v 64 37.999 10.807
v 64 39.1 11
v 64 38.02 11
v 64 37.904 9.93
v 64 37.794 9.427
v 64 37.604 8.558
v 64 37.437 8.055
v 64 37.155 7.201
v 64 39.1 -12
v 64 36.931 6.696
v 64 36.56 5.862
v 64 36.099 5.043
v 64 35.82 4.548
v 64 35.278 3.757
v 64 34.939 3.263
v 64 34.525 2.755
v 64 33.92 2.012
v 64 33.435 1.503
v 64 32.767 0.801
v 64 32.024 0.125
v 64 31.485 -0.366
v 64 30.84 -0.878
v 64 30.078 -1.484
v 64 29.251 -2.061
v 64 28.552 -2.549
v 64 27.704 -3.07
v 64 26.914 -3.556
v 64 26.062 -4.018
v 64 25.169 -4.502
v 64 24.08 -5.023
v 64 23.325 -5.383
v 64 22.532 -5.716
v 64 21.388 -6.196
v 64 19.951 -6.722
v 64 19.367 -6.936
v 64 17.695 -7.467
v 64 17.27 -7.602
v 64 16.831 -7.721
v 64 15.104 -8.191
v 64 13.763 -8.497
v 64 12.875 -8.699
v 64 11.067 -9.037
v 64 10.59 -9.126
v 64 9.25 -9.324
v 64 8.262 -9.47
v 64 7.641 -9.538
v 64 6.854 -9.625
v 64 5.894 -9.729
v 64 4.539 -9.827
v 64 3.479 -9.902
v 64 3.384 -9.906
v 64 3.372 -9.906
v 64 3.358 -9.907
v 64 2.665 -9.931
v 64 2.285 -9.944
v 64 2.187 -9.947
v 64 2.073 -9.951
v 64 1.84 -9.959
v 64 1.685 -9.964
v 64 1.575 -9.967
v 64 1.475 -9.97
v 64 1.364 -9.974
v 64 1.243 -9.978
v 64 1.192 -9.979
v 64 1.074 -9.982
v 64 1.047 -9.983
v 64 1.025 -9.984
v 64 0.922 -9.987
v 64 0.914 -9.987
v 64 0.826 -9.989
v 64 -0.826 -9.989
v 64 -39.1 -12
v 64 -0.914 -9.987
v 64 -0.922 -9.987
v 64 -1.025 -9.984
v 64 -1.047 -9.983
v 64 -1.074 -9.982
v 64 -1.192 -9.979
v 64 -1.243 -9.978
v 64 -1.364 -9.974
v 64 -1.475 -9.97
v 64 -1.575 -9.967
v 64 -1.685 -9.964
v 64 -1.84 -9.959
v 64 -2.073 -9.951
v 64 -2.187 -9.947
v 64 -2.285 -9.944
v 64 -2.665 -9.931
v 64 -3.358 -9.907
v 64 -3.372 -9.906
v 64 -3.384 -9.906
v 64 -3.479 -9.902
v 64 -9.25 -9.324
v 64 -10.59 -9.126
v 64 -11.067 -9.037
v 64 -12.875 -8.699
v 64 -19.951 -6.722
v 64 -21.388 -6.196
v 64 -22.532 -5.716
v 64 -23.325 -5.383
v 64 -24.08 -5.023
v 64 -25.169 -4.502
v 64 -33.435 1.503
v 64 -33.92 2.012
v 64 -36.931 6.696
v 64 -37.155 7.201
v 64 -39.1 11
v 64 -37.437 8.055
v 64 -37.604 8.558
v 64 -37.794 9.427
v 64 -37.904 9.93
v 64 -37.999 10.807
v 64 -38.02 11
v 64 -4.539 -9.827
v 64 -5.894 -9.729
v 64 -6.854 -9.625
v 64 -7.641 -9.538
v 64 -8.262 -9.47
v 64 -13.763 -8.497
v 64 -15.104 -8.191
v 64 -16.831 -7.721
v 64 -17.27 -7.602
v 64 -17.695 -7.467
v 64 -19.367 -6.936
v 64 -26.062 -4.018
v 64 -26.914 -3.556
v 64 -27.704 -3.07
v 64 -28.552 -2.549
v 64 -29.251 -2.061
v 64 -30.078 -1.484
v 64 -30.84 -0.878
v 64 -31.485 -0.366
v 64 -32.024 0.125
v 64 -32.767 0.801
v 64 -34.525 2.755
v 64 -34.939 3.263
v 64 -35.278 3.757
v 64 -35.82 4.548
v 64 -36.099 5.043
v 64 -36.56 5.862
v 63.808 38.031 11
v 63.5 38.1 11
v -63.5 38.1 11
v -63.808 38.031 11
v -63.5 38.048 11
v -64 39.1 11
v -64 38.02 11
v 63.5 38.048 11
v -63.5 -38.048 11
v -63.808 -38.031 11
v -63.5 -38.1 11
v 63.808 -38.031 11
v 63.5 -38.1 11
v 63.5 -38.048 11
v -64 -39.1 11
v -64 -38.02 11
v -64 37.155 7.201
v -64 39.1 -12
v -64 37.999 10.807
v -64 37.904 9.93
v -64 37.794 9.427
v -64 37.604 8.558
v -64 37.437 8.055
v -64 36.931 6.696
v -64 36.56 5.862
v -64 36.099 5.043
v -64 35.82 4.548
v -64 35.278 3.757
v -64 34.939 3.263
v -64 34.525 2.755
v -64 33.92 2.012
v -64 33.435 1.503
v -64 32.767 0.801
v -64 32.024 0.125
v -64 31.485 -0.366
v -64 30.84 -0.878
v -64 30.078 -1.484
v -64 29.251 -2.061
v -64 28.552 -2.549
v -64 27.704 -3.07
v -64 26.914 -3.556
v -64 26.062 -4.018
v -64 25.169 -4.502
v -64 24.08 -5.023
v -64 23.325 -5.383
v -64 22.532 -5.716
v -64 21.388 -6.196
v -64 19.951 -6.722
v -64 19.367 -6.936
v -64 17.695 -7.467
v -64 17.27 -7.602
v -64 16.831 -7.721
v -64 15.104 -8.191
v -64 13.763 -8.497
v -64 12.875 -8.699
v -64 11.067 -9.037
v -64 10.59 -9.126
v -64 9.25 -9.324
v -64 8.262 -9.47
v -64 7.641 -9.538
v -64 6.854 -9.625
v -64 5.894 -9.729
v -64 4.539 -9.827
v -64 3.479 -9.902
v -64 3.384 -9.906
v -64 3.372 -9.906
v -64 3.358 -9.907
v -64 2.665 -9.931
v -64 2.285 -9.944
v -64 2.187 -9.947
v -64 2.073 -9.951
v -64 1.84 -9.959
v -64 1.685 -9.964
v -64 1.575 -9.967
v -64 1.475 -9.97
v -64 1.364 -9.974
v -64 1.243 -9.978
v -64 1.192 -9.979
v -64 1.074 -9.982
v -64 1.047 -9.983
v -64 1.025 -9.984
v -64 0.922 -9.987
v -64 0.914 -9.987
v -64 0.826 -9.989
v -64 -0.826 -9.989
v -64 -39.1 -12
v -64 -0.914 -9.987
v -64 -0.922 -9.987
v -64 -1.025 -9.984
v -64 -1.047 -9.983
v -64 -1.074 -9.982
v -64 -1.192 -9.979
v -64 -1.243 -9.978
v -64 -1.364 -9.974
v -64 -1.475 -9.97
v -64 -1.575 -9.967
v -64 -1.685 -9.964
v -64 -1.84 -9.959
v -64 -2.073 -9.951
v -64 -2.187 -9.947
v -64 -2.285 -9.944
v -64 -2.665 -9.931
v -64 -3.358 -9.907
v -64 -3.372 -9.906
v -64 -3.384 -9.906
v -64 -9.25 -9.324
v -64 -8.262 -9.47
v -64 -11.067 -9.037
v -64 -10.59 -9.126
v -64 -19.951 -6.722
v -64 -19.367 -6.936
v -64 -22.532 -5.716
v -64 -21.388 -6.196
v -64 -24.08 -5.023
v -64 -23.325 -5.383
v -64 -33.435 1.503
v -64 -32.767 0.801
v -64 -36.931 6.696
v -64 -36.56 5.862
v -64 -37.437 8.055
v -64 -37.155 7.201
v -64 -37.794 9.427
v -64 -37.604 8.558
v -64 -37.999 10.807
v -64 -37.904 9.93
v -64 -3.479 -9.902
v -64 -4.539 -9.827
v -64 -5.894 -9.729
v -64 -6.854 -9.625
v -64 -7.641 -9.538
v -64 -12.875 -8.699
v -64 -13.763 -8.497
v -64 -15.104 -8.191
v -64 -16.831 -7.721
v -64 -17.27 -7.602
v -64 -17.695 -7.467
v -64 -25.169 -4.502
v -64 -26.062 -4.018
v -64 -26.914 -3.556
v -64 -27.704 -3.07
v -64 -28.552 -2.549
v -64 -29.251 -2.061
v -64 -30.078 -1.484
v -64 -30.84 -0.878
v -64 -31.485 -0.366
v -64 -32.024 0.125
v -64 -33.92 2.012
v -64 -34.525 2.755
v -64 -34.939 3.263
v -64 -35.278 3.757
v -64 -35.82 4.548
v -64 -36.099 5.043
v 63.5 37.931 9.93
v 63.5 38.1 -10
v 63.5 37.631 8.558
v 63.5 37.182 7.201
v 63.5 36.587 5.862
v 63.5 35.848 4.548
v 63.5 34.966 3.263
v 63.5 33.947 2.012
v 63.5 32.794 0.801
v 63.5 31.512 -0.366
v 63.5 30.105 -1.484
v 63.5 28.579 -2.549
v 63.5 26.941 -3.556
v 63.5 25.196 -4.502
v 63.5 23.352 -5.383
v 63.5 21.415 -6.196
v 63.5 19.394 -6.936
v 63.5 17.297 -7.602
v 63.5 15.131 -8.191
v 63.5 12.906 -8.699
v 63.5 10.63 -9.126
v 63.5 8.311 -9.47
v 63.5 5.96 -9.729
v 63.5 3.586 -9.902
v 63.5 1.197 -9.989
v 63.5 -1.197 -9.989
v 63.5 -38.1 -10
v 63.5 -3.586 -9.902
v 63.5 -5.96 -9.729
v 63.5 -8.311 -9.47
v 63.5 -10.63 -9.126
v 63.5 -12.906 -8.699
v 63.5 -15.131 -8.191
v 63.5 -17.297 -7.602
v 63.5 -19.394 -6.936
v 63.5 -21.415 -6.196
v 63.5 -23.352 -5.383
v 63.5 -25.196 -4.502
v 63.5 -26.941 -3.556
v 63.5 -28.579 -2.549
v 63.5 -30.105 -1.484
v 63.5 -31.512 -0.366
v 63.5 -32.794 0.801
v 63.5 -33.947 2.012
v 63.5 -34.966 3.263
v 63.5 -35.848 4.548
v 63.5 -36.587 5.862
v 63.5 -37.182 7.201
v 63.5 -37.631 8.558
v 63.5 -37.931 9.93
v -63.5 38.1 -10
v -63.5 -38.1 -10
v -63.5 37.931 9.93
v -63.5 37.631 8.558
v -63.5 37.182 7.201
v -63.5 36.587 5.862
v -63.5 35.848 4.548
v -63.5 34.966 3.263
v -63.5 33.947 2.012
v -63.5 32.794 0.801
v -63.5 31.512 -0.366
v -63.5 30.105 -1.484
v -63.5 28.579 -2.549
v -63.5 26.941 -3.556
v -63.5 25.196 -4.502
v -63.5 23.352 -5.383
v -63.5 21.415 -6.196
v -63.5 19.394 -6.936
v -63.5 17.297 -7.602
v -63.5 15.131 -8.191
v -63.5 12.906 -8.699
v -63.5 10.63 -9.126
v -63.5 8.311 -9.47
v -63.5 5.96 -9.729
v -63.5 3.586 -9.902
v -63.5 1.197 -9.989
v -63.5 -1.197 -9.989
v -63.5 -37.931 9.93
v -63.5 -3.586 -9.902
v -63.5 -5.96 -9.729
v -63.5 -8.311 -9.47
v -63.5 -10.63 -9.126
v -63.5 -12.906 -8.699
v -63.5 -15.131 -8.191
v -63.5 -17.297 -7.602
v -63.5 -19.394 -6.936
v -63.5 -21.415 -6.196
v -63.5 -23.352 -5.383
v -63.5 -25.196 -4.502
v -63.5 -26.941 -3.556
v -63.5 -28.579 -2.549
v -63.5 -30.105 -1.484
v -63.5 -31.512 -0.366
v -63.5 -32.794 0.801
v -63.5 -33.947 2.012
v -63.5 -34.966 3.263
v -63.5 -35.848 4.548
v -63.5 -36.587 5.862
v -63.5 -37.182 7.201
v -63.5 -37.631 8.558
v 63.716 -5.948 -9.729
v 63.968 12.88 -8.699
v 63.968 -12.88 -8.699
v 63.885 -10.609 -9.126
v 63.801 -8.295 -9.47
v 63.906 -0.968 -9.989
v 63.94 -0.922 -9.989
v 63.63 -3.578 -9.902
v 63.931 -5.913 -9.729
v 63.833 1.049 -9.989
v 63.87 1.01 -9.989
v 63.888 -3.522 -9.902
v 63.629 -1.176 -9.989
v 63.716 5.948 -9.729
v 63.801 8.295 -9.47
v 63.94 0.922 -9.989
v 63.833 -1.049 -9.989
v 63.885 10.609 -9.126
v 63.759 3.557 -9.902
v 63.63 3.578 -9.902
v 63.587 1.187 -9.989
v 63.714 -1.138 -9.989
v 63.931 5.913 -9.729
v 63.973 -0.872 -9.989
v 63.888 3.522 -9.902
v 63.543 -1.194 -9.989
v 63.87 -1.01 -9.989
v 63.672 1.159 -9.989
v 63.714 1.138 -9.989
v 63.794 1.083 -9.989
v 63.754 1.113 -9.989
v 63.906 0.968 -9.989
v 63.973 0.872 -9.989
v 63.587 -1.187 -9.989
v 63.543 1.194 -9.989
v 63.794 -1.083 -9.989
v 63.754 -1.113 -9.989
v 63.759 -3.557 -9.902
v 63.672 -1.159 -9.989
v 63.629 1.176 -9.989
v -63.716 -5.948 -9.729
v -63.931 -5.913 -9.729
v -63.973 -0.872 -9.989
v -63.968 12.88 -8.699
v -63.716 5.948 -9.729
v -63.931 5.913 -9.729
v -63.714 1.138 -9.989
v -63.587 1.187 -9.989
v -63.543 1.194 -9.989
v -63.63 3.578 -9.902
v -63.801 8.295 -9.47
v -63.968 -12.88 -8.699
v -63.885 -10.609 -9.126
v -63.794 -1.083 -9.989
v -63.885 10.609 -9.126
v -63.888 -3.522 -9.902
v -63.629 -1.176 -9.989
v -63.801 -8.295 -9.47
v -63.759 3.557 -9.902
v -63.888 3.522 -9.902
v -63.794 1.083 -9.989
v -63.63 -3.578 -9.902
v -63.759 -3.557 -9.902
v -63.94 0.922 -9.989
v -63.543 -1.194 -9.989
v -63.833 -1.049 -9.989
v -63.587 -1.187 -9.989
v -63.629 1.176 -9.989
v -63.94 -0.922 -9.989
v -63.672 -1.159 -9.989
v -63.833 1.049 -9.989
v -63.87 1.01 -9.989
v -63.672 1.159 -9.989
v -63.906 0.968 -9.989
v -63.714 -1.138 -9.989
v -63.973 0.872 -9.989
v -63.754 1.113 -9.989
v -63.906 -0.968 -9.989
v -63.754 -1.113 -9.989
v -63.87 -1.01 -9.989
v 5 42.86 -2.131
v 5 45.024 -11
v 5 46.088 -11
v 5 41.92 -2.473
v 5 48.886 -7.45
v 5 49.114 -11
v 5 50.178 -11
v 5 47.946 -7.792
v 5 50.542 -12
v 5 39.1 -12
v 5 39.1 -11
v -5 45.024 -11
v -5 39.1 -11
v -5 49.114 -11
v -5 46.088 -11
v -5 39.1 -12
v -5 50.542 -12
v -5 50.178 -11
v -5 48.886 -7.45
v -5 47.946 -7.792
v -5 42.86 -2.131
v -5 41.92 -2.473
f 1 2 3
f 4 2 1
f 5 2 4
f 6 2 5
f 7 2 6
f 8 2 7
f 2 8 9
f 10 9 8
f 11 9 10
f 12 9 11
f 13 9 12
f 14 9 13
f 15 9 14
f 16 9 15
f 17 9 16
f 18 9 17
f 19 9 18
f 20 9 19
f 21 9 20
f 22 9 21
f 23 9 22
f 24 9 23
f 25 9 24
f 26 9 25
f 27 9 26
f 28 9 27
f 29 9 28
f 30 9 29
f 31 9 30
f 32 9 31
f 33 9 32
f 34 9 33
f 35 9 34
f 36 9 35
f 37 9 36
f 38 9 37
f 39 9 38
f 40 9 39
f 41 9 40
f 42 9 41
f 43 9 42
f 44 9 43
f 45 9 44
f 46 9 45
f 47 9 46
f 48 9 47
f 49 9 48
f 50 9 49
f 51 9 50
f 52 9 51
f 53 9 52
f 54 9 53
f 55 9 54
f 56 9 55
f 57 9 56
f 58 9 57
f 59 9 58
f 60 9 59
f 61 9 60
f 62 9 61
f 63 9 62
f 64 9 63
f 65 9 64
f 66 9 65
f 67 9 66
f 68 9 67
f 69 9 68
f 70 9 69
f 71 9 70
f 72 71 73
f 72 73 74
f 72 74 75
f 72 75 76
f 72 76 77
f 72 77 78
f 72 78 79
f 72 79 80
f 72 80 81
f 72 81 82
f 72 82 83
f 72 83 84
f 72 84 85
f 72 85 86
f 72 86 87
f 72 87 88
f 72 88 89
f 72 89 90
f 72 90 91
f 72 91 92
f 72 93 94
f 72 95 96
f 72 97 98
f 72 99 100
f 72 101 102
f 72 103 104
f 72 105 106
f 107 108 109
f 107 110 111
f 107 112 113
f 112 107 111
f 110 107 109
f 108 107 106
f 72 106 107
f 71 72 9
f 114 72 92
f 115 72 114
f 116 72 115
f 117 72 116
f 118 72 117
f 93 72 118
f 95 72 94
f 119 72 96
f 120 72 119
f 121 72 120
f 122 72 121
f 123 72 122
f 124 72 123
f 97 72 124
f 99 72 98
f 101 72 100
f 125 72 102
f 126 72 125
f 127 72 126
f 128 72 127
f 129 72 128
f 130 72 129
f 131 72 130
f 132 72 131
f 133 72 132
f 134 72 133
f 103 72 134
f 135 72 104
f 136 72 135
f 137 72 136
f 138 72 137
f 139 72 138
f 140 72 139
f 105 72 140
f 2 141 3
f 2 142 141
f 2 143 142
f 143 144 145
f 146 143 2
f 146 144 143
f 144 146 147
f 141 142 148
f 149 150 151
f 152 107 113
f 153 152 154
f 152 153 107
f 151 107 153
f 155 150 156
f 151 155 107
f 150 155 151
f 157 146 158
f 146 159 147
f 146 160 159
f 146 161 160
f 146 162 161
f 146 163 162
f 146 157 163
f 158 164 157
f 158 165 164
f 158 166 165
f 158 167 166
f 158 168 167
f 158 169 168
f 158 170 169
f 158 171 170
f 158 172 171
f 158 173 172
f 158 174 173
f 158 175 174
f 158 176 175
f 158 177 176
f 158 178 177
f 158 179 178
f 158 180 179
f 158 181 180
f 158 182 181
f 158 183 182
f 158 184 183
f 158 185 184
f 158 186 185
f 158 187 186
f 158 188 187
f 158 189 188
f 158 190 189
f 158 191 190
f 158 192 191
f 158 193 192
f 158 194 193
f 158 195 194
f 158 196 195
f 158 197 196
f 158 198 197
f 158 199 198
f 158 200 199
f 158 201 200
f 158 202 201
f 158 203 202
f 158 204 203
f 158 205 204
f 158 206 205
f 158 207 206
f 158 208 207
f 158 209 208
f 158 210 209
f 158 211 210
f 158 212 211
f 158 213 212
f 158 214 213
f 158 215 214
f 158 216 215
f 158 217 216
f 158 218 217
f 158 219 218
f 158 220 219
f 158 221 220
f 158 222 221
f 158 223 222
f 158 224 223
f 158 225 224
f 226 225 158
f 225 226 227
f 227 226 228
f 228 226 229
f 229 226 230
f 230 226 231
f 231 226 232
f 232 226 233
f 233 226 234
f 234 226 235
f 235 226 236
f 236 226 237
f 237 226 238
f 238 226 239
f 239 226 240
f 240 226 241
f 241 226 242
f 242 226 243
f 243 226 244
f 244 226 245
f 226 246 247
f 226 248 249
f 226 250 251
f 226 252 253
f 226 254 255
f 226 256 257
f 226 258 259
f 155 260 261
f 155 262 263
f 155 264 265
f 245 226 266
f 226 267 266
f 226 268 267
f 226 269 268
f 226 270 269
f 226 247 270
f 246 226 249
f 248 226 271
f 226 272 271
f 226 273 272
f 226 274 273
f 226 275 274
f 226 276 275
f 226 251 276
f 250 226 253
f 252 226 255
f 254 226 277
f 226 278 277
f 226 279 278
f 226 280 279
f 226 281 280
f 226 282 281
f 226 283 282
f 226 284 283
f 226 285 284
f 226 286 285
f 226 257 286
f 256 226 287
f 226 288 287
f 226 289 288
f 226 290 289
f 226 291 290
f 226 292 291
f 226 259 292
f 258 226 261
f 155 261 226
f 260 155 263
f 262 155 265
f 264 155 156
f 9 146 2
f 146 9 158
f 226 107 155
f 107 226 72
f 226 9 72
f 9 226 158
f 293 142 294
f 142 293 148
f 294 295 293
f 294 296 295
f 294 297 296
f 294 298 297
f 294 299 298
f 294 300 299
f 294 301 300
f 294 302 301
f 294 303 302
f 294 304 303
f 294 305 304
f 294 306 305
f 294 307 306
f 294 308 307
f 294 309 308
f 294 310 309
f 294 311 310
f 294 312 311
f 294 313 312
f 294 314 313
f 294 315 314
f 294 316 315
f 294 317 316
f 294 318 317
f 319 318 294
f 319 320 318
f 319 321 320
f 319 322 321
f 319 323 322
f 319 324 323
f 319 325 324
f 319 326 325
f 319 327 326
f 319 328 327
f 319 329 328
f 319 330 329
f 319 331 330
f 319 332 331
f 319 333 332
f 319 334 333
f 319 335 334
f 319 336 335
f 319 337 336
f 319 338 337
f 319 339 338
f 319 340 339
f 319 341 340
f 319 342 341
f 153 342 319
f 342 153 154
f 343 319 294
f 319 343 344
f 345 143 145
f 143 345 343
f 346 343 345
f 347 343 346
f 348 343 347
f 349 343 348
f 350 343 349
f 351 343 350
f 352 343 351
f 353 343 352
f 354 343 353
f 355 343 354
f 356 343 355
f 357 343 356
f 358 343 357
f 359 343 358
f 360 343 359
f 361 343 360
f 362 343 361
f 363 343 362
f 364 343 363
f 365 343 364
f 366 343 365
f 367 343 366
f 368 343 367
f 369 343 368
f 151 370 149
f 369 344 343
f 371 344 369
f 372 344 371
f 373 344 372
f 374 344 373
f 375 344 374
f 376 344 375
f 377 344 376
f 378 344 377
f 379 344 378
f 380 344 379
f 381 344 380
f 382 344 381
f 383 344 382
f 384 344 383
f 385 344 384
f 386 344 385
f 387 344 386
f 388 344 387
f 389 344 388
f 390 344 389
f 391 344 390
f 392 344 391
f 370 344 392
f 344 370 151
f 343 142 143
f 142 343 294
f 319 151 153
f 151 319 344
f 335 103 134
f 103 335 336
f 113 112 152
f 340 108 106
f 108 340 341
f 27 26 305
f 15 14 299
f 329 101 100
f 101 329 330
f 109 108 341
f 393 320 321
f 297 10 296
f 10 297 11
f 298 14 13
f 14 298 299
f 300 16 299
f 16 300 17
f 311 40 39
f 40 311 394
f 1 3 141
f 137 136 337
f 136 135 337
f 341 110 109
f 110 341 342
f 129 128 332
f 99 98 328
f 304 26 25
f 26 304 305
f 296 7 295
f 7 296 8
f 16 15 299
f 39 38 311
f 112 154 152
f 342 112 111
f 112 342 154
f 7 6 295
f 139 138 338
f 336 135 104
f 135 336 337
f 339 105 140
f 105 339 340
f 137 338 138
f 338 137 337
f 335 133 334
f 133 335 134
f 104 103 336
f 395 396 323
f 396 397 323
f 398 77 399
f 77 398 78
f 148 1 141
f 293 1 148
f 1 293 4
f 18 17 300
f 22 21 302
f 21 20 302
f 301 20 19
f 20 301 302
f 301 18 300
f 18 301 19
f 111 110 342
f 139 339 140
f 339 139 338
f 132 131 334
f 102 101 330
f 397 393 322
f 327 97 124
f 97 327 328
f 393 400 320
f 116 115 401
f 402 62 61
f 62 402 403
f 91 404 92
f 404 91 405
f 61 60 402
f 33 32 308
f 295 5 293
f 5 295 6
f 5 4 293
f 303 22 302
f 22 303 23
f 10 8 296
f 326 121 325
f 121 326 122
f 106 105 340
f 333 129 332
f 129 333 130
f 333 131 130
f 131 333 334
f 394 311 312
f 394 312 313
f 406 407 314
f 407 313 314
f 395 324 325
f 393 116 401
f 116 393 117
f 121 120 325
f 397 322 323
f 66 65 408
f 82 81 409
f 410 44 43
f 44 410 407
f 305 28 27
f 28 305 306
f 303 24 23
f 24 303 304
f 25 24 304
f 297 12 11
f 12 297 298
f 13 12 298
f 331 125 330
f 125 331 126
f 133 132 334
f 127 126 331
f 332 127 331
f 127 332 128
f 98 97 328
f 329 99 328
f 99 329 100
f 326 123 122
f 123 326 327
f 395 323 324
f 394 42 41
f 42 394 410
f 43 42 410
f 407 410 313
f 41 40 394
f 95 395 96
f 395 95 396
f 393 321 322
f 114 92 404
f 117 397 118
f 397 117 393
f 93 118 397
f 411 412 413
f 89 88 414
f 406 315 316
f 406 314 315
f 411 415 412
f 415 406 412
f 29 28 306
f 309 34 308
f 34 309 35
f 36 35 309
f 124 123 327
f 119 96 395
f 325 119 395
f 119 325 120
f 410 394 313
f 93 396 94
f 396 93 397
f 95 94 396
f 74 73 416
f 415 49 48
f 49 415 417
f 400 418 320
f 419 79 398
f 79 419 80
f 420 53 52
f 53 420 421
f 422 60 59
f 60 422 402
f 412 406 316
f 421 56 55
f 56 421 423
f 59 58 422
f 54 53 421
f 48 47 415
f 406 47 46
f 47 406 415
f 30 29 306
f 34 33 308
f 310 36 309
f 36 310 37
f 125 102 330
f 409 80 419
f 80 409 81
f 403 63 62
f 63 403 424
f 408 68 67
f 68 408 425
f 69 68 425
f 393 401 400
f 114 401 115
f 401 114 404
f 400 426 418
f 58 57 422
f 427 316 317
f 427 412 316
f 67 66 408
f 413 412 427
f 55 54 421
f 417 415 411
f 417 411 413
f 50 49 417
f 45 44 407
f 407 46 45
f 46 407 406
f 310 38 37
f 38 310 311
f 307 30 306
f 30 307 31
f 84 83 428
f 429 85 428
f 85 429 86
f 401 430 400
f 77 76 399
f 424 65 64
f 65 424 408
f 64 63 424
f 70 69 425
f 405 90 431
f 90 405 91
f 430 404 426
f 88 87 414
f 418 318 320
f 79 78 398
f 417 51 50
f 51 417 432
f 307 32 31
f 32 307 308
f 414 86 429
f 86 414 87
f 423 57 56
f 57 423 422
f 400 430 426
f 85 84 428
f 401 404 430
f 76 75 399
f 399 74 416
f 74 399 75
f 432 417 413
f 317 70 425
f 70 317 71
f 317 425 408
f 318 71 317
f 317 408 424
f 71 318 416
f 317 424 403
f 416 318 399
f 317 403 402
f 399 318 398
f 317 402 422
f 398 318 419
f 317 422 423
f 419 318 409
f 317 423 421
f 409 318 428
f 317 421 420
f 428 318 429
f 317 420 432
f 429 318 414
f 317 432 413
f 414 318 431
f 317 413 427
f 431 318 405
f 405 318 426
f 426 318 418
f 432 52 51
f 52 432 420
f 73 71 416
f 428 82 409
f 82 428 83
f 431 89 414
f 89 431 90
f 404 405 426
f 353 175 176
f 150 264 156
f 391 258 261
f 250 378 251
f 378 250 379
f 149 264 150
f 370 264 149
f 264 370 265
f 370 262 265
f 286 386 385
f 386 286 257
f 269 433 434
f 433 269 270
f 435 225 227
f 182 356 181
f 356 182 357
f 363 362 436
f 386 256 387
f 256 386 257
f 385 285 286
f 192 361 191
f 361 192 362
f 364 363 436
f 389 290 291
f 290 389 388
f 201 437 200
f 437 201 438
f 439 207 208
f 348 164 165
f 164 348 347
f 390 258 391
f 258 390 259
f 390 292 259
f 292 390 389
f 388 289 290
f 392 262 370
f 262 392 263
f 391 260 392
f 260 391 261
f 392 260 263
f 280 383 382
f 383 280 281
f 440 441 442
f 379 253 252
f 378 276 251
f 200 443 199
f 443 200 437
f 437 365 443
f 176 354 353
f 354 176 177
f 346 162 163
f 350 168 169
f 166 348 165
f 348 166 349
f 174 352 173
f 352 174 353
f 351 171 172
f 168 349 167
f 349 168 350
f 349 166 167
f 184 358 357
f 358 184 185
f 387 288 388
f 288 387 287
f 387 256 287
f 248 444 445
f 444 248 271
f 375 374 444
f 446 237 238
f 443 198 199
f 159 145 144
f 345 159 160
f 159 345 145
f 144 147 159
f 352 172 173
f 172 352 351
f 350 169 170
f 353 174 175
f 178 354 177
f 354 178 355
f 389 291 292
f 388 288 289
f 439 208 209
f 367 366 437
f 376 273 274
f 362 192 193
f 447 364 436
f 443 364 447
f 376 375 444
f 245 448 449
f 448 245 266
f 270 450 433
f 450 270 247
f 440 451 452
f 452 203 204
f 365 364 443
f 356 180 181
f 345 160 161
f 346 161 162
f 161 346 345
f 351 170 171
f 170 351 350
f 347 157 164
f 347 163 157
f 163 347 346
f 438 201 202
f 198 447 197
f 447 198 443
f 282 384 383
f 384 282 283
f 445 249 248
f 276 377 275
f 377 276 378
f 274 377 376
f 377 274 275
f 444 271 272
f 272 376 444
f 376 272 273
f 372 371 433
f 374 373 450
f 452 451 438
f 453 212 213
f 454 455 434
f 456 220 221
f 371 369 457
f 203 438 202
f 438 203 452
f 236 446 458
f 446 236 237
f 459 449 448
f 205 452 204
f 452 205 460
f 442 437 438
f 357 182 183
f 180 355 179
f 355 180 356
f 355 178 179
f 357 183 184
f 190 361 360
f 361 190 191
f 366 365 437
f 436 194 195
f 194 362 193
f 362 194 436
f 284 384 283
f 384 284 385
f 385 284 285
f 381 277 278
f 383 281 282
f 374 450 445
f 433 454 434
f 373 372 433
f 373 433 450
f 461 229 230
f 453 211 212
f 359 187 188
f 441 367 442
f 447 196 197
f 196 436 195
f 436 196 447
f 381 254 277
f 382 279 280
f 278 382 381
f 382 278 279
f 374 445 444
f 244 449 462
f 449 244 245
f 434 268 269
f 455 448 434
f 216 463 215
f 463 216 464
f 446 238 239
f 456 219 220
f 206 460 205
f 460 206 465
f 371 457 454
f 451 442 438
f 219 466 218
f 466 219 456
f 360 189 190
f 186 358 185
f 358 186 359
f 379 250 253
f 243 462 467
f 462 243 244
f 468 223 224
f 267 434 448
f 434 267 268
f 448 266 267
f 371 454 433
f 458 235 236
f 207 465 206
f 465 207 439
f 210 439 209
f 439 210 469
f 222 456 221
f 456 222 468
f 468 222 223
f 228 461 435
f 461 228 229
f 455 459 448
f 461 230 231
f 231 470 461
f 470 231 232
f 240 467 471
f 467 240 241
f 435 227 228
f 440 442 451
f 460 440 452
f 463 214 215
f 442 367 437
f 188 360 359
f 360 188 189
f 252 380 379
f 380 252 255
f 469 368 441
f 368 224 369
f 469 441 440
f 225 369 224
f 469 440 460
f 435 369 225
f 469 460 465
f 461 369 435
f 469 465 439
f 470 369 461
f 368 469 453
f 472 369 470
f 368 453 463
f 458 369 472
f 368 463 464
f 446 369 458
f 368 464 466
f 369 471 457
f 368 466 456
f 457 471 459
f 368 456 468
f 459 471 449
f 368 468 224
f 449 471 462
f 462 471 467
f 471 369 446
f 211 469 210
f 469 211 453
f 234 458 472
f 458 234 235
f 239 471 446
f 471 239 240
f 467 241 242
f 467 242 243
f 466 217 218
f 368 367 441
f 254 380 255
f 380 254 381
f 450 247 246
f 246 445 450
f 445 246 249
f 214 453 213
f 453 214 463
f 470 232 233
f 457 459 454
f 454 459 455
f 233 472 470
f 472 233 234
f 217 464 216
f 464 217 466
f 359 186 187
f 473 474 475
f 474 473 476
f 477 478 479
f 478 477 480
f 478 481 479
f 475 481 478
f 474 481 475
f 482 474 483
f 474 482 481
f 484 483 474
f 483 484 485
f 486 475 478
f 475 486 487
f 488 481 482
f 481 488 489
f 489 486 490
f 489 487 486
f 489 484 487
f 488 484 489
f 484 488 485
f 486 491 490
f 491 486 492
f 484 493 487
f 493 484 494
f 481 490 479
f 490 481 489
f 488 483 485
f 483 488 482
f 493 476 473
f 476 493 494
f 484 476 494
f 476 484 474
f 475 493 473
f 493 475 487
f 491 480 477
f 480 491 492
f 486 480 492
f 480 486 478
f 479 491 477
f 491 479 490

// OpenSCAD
// Add some tolerance if needed
width = 127; // 5 inch in millimeter
// Add some tolerance if needed
length = 76.2; // 3 inch in millimeter
height = 22;
wall_thickness = 1;
floor_thickness = 2;

$fn = 100;

module notes_display_and_holder(){
    union(){
        // Papers holder
        difference(){
            union(){
                cube([width + wall_thickness, length + wall_thickness + wall_thickness, height], center = true);
                translate([0, 0, -height/2])
                cube([width + wall_thickness, length + wall_thickness + wall_thickness, floor_thickness], center = true);
            }
            translate([0, 0, wall_thickness])
            cube([width, length, height], center = true);

            // Right cutout
            translate([width / 2, 0, (height / 2) + wall_thickness])
            scale([1, length / height / 2, 1])
            sphere(r = height);
            // Left cutout
            translate([width / -2, 0,(height / 2) + wall_thickness])
            scale([1, length / height / 2, 1])
            sphere(r = height);
        }

        // Paper clip
        translate([0, (length/ 2) + wall_thickness, (-(height + floor_thickness) / 2) + 0.5])
        union(){
            // base
            translate([0, 5.5, 0])
            cube([10, 11, 1], center = true);
            // back
            translate([0, 5, 4.5])
            rotate([20, 0, 0])
            cube([10, 1, 10], center = true);
            // front
            translate([0, 10, 2])
            rotate([20, 0, 0])
            cube([10, 1, 4], center = true);
            intersection(){
                translate([0, 5.5, 0])
                cube([10, 110, 1], center = true);
                translate([0, 5, 4.5])
                rotate([20, 0, 0])
                cube([10, 1, 200], center = true);
            }
            intersection(){
                translate([0, 5.5, 0])
                cube([10, 110, 1], center = true);
                translate([0, 10, 2])
                rotate([20, 0, 0])
                cube([10, 1, 40], center = true);
            }
        }
    }
}



notes_display_and_holder();
